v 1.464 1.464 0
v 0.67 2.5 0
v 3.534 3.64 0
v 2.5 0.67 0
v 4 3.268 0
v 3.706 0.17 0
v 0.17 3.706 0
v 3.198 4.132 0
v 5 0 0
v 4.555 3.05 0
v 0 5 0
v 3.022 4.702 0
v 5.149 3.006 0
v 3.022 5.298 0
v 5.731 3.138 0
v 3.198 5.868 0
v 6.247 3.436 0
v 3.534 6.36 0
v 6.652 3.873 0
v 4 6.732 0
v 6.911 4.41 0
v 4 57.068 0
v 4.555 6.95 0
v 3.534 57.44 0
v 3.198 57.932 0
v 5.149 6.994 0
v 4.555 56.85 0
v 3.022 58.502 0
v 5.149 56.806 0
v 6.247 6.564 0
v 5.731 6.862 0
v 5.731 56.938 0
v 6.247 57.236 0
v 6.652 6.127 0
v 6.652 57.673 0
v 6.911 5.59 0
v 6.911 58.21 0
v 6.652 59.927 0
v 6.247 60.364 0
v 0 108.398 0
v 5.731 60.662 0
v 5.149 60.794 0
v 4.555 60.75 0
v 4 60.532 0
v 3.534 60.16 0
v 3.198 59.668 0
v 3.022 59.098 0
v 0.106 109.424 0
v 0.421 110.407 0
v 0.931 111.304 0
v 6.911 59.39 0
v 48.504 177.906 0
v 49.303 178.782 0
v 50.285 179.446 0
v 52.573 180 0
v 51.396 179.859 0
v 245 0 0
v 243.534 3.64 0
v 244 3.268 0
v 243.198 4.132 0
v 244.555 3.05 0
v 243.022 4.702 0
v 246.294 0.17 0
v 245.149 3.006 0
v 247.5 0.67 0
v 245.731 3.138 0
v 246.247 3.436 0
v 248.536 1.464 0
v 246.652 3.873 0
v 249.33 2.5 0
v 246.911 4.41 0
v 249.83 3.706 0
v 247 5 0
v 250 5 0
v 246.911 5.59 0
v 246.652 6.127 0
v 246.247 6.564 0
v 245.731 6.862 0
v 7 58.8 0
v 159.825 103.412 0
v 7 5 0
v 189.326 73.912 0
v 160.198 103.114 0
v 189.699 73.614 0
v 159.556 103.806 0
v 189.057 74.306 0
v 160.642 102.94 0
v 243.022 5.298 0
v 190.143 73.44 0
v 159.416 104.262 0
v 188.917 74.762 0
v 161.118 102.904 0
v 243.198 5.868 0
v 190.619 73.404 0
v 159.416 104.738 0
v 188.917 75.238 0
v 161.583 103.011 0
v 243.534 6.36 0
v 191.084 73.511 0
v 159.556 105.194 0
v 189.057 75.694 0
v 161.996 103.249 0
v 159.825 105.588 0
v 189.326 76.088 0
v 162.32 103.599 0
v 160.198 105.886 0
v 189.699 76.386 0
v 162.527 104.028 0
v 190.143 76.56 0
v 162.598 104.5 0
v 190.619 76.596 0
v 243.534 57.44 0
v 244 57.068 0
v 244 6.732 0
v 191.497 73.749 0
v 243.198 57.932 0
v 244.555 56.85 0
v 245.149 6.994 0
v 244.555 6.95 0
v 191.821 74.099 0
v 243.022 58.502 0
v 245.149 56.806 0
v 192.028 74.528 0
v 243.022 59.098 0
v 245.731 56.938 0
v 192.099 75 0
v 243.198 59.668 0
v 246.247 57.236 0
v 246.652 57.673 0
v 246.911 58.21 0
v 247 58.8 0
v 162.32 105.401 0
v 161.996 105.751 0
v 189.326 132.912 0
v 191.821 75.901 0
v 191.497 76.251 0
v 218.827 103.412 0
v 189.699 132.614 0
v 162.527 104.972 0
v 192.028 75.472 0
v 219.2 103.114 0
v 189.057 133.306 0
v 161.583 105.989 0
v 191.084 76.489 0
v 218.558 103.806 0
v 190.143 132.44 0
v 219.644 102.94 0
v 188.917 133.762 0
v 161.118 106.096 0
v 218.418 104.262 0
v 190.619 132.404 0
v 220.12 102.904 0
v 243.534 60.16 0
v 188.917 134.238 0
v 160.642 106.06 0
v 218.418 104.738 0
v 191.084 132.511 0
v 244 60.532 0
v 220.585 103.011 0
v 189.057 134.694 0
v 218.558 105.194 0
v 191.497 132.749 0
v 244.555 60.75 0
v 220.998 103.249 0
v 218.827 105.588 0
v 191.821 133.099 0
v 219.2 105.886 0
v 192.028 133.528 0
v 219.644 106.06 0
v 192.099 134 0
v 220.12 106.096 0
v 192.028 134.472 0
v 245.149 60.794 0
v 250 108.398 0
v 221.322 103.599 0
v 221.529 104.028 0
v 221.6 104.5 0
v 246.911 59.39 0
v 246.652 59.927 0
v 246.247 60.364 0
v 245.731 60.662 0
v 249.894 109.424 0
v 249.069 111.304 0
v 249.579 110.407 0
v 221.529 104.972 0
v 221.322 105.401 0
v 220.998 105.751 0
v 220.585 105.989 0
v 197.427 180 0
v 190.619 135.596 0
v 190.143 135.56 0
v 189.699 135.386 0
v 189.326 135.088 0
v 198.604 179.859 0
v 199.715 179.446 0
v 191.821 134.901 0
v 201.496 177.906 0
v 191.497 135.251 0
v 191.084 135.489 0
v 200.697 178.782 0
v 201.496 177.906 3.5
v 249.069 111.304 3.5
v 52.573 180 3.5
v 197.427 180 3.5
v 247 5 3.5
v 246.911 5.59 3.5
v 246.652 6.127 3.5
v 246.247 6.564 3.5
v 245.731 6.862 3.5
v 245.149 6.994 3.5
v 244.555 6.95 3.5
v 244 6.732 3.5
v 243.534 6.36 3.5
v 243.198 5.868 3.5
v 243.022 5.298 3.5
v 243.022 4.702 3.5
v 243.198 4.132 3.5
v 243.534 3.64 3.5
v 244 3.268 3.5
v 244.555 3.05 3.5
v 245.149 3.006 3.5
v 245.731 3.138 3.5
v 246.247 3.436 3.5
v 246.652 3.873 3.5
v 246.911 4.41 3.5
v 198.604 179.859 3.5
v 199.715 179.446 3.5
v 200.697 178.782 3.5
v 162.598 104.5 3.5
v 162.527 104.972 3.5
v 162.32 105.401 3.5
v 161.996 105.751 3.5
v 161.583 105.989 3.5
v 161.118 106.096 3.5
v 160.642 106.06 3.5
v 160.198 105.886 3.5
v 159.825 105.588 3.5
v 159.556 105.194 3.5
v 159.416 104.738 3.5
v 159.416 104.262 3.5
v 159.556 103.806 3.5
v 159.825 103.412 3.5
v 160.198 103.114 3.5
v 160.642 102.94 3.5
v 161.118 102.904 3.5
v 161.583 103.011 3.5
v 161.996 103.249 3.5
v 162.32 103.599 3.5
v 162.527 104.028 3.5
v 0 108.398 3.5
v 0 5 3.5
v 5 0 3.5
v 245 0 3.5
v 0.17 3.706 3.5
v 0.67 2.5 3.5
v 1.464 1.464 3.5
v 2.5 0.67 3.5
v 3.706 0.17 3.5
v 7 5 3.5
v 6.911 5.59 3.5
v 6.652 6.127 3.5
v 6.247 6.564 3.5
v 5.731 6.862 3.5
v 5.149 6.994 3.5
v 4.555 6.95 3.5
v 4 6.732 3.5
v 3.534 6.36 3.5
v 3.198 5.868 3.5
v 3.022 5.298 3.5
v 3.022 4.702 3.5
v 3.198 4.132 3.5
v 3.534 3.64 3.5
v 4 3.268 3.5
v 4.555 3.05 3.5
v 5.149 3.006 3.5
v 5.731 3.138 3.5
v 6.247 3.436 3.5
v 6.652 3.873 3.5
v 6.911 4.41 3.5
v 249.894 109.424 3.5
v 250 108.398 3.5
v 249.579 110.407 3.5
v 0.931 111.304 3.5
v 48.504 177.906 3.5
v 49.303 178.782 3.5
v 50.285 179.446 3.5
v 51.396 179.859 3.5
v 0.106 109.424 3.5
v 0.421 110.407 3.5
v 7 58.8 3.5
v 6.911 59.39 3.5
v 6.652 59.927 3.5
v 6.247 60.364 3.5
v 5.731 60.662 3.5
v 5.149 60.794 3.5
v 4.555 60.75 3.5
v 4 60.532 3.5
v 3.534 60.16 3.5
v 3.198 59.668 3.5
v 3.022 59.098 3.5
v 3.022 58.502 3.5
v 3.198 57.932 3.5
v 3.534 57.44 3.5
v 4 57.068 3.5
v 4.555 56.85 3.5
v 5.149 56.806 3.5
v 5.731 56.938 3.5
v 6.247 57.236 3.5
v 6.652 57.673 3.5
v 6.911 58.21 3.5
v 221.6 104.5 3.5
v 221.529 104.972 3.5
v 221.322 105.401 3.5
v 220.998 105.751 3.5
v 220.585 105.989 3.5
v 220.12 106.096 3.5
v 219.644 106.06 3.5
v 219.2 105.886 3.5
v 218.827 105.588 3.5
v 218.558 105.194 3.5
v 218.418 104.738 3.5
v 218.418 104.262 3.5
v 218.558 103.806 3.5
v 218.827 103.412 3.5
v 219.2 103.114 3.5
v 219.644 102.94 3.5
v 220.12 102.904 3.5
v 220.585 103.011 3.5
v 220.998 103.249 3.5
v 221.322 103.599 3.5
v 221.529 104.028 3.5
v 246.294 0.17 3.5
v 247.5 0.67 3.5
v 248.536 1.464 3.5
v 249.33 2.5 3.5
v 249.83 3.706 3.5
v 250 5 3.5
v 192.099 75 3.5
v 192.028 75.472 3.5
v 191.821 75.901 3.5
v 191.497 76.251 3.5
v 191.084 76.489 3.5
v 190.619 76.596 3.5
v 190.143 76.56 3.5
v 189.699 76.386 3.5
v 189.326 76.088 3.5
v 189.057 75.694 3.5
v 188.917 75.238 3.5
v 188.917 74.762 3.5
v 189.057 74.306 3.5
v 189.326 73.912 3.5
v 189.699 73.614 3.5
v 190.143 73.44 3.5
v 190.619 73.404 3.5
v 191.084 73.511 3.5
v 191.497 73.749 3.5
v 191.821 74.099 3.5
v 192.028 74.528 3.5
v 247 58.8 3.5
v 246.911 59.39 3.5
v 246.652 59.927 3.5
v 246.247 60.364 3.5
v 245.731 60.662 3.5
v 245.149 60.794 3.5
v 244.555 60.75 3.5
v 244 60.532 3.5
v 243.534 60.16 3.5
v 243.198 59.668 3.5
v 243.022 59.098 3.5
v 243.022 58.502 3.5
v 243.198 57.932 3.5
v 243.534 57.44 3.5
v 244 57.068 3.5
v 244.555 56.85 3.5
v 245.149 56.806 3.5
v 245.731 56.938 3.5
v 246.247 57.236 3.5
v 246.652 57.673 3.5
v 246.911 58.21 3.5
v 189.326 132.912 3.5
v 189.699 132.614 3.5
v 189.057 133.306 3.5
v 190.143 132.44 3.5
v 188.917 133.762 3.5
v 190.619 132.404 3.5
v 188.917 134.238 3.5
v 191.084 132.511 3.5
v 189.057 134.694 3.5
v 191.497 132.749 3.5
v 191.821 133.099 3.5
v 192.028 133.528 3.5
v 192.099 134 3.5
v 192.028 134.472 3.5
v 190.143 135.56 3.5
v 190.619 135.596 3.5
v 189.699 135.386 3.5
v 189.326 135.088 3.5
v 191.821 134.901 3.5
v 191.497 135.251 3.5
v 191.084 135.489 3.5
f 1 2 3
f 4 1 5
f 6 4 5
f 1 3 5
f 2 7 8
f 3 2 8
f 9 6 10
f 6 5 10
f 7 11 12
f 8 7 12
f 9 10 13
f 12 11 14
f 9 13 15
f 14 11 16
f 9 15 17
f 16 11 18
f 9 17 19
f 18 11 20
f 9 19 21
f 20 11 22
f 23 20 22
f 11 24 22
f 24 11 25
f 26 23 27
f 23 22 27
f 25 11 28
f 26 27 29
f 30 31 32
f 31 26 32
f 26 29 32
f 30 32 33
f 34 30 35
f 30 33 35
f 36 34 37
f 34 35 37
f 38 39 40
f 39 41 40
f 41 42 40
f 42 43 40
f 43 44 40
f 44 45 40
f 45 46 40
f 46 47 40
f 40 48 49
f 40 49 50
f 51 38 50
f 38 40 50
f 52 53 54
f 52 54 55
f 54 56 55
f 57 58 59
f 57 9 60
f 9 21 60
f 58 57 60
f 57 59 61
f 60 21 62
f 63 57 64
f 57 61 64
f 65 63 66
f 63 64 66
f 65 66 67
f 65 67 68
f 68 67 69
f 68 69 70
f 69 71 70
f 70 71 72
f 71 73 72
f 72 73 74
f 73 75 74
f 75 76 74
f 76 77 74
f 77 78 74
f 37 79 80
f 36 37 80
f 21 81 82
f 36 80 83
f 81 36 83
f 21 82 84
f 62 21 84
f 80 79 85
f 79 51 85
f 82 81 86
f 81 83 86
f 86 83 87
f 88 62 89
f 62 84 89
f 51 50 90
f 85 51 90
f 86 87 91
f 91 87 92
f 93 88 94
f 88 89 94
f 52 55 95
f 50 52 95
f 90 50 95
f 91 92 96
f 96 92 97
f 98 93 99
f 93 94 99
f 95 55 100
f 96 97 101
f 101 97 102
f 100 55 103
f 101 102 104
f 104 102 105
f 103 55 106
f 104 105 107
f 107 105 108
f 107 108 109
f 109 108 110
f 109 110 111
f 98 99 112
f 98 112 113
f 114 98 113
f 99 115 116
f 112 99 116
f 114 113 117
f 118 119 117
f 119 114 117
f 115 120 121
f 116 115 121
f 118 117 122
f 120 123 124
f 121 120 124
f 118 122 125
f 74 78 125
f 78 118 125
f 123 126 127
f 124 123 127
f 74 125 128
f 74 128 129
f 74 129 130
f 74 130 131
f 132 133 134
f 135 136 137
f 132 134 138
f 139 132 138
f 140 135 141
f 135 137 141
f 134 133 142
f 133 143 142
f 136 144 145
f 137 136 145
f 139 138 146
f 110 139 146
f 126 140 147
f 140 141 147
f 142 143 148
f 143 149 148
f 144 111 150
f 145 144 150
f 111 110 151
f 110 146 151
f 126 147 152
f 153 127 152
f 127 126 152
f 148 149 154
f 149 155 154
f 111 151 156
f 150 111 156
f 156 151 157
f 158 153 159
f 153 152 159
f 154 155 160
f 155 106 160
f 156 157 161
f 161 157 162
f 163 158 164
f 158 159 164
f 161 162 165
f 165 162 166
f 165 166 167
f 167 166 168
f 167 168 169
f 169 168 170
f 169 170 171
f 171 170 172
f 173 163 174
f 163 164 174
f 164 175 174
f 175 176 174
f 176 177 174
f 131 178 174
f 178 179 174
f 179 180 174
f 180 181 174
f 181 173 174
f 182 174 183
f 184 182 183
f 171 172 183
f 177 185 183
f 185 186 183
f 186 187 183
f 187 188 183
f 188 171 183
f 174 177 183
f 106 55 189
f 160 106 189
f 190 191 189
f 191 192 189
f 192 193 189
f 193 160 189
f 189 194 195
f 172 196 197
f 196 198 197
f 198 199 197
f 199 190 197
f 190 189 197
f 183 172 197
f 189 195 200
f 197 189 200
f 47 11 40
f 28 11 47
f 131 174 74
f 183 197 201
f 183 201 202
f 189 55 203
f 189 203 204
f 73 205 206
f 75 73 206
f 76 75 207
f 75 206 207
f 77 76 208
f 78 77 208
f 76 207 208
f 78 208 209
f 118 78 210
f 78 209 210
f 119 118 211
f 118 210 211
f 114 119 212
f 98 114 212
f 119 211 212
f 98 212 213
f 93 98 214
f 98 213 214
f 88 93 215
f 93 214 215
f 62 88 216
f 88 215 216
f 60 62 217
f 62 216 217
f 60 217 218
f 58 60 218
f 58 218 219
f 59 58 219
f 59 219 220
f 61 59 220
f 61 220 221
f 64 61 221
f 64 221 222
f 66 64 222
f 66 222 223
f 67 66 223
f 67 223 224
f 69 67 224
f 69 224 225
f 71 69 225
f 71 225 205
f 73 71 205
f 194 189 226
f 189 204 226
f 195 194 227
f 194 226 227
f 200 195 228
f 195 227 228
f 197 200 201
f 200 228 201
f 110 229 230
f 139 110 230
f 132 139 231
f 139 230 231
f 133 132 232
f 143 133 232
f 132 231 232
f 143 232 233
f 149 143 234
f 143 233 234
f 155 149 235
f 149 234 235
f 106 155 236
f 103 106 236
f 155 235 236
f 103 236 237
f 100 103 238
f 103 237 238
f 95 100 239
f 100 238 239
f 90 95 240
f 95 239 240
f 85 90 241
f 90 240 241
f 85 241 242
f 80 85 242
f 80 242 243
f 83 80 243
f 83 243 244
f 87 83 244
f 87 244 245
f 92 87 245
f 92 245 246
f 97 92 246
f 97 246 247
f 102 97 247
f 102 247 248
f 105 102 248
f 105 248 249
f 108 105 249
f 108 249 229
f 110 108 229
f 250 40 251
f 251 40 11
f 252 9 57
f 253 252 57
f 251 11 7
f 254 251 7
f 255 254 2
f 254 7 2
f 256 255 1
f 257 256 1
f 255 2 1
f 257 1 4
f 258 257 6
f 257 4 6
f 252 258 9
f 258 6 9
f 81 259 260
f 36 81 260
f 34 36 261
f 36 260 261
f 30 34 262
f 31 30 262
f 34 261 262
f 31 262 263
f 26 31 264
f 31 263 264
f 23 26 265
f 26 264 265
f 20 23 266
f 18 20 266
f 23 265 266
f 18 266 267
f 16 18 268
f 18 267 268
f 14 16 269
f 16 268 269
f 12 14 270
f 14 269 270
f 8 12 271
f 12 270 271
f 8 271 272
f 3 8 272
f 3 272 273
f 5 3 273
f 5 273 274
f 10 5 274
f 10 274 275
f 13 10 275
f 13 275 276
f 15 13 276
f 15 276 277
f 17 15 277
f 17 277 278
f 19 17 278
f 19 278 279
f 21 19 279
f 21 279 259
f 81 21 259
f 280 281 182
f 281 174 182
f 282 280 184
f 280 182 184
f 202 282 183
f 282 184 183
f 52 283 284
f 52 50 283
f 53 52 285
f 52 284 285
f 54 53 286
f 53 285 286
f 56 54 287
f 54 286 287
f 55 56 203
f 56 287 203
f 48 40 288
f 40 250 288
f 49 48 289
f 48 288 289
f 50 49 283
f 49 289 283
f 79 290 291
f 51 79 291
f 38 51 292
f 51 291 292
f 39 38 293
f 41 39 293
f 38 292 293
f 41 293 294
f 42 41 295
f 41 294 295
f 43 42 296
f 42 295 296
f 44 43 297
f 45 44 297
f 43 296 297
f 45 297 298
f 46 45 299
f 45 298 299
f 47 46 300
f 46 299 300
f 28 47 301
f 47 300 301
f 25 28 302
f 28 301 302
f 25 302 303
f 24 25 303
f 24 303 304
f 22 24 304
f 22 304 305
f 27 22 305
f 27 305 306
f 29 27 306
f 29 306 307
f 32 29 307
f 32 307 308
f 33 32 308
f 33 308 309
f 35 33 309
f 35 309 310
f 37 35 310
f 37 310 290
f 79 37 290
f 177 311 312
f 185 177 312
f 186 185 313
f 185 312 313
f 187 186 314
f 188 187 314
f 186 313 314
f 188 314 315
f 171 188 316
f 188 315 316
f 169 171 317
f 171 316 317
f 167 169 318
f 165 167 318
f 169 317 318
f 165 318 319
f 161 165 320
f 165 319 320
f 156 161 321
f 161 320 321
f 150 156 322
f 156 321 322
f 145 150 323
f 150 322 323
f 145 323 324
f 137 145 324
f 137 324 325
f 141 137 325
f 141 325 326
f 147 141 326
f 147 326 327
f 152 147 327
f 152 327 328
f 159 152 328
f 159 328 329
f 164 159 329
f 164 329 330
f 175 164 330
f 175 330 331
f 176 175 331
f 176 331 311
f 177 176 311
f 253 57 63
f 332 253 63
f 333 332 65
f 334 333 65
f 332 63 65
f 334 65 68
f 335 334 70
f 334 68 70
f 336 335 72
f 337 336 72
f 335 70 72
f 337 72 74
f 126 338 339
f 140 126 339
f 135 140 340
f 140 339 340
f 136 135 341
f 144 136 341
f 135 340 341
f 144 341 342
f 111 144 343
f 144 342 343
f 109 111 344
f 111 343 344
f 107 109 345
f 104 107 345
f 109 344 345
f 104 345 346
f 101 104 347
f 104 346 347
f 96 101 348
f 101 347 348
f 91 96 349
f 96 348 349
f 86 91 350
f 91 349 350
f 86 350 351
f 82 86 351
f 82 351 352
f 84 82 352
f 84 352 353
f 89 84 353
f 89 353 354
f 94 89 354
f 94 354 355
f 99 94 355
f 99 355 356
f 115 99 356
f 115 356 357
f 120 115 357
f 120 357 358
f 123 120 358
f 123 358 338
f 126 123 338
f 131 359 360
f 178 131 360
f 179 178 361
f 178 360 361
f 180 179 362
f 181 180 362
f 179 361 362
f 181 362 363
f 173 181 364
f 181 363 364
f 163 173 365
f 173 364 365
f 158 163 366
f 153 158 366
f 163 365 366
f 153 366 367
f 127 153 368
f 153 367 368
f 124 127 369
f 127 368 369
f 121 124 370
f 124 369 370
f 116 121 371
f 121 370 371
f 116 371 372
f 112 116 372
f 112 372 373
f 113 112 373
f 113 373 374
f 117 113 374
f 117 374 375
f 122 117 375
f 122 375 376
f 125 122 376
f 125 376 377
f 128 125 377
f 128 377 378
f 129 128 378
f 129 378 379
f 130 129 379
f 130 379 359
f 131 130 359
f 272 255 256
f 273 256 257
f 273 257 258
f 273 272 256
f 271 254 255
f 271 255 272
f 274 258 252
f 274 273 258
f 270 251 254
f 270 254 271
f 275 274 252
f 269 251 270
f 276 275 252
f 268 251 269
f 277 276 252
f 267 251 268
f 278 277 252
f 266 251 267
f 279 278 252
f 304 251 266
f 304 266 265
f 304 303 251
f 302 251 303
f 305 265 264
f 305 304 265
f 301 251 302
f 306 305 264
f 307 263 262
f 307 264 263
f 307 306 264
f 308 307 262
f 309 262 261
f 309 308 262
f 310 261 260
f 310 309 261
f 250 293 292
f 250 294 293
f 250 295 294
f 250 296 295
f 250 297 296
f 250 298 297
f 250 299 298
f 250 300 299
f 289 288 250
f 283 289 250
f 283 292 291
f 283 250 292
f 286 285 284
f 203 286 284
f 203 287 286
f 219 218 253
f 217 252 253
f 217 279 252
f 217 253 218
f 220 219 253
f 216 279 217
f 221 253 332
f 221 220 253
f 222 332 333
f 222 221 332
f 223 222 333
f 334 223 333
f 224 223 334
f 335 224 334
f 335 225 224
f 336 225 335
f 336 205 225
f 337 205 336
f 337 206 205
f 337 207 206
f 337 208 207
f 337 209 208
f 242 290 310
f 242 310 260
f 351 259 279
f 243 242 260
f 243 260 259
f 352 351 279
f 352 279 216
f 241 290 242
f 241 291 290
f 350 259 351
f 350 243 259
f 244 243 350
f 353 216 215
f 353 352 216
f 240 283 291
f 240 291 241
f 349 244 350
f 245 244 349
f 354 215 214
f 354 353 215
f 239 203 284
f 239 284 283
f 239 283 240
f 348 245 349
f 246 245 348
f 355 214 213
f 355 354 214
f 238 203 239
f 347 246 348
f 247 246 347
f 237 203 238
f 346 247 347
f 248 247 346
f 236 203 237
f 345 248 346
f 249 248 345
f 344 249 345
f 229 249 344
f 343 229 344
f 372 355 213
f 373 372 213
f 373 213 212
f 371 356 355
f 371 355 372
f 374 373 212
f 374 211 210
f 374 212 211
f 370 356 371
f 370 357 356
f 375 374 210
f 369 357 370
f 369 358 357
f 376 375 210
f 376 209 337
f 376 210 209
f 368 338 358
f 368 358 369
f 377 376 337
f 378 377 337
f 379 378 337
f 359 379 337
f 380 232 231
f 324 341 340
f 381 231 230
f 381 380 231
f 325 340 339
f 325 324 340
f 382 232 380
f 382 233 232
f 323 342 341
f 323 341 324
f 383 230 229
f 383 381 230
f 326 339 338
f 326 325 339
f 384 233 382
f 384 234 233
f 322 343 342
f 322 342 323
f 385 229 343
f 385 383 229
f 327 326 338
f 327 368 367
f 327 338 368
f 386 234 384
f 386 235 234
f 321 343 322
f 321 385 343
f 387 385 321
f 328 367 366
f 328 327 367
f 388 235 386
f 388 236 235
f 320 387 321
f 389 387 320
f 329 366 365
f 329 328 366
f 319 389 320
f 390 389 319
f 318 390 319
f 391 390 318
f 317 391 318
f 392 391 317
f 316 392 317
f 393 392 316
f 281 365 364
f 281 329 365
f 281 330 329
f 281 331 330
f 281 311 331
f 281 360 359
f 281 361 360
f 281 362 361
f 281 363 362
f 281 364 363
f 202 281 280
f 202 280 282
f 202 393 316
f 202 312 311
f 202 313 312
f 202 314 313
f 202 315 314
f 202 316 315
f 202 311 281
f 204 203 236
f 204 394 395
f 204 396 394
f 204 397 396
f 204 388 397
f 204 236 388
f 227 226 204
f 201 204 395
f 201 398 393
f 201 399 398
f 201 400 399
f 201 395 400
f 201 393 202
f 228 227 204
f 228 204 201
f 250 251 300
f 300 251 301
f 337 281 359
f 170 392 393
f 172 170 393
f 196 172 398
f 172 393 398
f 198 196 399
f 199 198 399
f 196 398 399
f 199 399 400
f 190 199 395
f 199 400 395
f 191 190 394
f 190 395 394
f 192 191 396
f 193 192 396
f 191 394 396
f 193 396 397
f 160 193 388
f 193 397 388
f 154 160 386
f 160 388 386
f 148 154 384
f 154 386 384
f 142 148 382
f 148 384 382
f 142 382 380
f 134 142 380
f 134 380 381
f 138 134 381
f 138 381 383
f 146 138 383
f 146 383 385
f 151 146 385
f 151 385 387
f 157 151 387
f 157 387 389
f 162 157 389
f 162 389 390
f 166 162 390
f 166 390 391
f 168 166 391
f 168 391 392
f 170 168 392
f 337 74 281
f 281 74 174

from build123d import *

# Parameters (mm, degrees)
BOSS_EXTRU_1_DEPTH           = 3.5
ESQUISSE2_R                  = 2
ENL_V_MAT_EXTRU_1_DEPTH      = 395.382111663
ENL_V_MAT_EXTRU_2_DEPTH      = 395.382111663
ENL_V_MAT_EXTRU_2_DEPTH_BACK = 395.382111663
CONG_1_R                     = 5
ESQUISSE4_R                  = 1.6
ENL_V_MAT_EXTRU_4_DEPTH      = 309.078317965


with BuildPart() as part:
    # Esquisse1 → Boss.-Extru.1 (new body)
    with BuildSketch(Plane.XY):
        with BuildLine():
            Line((5, 0), (245, 0))
            ThreePointArc((245, 0), (248.535533906, 1.464466094), (250, 5))
            Line((250, 5), (250, 305))
            Line((250, 305), (0, 305))
            Line((0, 305), (0, 5))
            ThreePointArc((0, 5), (1.464466094, 1.464466094), (5, 0))
        make_face()
    extrude(amount=BOSS_EXTRU_1_DEPTH)

    # Esquisse2 → Enlèv. mat.-Extru.1 (cut, through all)
    with BuildSketch(Plane.XY.offset(3.5)):
        with Locations((5, 5)):
            Circle(ESQUISSE2_R)
        with Locations((245, 5)):
            Circle(ESQUISSE2_R)
        with Locations((5, 58.8)):
            Circle(ESQUISSE2_R)
        with Locations((245, 58.8)):
            Circle(ESQUISSE2_R)
    extrude(amount=-ENL_V_MAT_EXTRU_1_DEPTH, mode=Mode.SUBTRACT)

    # Esquisse3 → Enlèv. mat.-Extru.2 (cut, two sides: drawn at the far end of the back side and taken through both)
    with BuildSketch(Plane.XY.offset(3.5).offset(-ENL_V_MAT_EXTRU_2_DEPTH_BACK)):
        Polygon((-374.383398967, -414.136758554), (0, 110), (50, 180), (200, 180), (250, 110), (624.383398967, -414.136758554), (624.383398967, 874.090350445), (-374.383398967, 874.090350445), align=None)
    extrude(amount=ENL_V_MAT_EXTRU_2_DEPTH + ENL_V_MAT_EXTRU_2_DEPTH_BACK, mode=Mode.SUBTRACT)

    # Congé1
    cong_1_edges = [part.edges().sort_by_distance(p)[0] for p in [
        (50, 180, 1.75),
        (200, 180, 1.75),
        (250, 110, 1.75),
        (0, 110, 1.75),
    ]]
    fillet(cong_1_edges, radius=CONG_1_R)

    # Esquisse4 → Enlèv. mat.-Extru.4 (cut, through all)
    with BuildSketch(Plane.XY.offset(3.5)):
        with Locations((220, 104.5)):
            Circle(ESQUISSE4_R)
        with Locations((190.499010186, 134)):
            Circle(ESQUISSE4_R)
        with Locations((160.998020372, 104.5)):
            Circle(ESQUISSE4_R)
        with Locations((190.499010186, 75)):
            Circle(ESQUISSE4_R)
    extrude(amount=-ENL_V_MAT_EXTRU_4_DEPTH, mode=Mode.SUBTRACT)


solid = part.part
